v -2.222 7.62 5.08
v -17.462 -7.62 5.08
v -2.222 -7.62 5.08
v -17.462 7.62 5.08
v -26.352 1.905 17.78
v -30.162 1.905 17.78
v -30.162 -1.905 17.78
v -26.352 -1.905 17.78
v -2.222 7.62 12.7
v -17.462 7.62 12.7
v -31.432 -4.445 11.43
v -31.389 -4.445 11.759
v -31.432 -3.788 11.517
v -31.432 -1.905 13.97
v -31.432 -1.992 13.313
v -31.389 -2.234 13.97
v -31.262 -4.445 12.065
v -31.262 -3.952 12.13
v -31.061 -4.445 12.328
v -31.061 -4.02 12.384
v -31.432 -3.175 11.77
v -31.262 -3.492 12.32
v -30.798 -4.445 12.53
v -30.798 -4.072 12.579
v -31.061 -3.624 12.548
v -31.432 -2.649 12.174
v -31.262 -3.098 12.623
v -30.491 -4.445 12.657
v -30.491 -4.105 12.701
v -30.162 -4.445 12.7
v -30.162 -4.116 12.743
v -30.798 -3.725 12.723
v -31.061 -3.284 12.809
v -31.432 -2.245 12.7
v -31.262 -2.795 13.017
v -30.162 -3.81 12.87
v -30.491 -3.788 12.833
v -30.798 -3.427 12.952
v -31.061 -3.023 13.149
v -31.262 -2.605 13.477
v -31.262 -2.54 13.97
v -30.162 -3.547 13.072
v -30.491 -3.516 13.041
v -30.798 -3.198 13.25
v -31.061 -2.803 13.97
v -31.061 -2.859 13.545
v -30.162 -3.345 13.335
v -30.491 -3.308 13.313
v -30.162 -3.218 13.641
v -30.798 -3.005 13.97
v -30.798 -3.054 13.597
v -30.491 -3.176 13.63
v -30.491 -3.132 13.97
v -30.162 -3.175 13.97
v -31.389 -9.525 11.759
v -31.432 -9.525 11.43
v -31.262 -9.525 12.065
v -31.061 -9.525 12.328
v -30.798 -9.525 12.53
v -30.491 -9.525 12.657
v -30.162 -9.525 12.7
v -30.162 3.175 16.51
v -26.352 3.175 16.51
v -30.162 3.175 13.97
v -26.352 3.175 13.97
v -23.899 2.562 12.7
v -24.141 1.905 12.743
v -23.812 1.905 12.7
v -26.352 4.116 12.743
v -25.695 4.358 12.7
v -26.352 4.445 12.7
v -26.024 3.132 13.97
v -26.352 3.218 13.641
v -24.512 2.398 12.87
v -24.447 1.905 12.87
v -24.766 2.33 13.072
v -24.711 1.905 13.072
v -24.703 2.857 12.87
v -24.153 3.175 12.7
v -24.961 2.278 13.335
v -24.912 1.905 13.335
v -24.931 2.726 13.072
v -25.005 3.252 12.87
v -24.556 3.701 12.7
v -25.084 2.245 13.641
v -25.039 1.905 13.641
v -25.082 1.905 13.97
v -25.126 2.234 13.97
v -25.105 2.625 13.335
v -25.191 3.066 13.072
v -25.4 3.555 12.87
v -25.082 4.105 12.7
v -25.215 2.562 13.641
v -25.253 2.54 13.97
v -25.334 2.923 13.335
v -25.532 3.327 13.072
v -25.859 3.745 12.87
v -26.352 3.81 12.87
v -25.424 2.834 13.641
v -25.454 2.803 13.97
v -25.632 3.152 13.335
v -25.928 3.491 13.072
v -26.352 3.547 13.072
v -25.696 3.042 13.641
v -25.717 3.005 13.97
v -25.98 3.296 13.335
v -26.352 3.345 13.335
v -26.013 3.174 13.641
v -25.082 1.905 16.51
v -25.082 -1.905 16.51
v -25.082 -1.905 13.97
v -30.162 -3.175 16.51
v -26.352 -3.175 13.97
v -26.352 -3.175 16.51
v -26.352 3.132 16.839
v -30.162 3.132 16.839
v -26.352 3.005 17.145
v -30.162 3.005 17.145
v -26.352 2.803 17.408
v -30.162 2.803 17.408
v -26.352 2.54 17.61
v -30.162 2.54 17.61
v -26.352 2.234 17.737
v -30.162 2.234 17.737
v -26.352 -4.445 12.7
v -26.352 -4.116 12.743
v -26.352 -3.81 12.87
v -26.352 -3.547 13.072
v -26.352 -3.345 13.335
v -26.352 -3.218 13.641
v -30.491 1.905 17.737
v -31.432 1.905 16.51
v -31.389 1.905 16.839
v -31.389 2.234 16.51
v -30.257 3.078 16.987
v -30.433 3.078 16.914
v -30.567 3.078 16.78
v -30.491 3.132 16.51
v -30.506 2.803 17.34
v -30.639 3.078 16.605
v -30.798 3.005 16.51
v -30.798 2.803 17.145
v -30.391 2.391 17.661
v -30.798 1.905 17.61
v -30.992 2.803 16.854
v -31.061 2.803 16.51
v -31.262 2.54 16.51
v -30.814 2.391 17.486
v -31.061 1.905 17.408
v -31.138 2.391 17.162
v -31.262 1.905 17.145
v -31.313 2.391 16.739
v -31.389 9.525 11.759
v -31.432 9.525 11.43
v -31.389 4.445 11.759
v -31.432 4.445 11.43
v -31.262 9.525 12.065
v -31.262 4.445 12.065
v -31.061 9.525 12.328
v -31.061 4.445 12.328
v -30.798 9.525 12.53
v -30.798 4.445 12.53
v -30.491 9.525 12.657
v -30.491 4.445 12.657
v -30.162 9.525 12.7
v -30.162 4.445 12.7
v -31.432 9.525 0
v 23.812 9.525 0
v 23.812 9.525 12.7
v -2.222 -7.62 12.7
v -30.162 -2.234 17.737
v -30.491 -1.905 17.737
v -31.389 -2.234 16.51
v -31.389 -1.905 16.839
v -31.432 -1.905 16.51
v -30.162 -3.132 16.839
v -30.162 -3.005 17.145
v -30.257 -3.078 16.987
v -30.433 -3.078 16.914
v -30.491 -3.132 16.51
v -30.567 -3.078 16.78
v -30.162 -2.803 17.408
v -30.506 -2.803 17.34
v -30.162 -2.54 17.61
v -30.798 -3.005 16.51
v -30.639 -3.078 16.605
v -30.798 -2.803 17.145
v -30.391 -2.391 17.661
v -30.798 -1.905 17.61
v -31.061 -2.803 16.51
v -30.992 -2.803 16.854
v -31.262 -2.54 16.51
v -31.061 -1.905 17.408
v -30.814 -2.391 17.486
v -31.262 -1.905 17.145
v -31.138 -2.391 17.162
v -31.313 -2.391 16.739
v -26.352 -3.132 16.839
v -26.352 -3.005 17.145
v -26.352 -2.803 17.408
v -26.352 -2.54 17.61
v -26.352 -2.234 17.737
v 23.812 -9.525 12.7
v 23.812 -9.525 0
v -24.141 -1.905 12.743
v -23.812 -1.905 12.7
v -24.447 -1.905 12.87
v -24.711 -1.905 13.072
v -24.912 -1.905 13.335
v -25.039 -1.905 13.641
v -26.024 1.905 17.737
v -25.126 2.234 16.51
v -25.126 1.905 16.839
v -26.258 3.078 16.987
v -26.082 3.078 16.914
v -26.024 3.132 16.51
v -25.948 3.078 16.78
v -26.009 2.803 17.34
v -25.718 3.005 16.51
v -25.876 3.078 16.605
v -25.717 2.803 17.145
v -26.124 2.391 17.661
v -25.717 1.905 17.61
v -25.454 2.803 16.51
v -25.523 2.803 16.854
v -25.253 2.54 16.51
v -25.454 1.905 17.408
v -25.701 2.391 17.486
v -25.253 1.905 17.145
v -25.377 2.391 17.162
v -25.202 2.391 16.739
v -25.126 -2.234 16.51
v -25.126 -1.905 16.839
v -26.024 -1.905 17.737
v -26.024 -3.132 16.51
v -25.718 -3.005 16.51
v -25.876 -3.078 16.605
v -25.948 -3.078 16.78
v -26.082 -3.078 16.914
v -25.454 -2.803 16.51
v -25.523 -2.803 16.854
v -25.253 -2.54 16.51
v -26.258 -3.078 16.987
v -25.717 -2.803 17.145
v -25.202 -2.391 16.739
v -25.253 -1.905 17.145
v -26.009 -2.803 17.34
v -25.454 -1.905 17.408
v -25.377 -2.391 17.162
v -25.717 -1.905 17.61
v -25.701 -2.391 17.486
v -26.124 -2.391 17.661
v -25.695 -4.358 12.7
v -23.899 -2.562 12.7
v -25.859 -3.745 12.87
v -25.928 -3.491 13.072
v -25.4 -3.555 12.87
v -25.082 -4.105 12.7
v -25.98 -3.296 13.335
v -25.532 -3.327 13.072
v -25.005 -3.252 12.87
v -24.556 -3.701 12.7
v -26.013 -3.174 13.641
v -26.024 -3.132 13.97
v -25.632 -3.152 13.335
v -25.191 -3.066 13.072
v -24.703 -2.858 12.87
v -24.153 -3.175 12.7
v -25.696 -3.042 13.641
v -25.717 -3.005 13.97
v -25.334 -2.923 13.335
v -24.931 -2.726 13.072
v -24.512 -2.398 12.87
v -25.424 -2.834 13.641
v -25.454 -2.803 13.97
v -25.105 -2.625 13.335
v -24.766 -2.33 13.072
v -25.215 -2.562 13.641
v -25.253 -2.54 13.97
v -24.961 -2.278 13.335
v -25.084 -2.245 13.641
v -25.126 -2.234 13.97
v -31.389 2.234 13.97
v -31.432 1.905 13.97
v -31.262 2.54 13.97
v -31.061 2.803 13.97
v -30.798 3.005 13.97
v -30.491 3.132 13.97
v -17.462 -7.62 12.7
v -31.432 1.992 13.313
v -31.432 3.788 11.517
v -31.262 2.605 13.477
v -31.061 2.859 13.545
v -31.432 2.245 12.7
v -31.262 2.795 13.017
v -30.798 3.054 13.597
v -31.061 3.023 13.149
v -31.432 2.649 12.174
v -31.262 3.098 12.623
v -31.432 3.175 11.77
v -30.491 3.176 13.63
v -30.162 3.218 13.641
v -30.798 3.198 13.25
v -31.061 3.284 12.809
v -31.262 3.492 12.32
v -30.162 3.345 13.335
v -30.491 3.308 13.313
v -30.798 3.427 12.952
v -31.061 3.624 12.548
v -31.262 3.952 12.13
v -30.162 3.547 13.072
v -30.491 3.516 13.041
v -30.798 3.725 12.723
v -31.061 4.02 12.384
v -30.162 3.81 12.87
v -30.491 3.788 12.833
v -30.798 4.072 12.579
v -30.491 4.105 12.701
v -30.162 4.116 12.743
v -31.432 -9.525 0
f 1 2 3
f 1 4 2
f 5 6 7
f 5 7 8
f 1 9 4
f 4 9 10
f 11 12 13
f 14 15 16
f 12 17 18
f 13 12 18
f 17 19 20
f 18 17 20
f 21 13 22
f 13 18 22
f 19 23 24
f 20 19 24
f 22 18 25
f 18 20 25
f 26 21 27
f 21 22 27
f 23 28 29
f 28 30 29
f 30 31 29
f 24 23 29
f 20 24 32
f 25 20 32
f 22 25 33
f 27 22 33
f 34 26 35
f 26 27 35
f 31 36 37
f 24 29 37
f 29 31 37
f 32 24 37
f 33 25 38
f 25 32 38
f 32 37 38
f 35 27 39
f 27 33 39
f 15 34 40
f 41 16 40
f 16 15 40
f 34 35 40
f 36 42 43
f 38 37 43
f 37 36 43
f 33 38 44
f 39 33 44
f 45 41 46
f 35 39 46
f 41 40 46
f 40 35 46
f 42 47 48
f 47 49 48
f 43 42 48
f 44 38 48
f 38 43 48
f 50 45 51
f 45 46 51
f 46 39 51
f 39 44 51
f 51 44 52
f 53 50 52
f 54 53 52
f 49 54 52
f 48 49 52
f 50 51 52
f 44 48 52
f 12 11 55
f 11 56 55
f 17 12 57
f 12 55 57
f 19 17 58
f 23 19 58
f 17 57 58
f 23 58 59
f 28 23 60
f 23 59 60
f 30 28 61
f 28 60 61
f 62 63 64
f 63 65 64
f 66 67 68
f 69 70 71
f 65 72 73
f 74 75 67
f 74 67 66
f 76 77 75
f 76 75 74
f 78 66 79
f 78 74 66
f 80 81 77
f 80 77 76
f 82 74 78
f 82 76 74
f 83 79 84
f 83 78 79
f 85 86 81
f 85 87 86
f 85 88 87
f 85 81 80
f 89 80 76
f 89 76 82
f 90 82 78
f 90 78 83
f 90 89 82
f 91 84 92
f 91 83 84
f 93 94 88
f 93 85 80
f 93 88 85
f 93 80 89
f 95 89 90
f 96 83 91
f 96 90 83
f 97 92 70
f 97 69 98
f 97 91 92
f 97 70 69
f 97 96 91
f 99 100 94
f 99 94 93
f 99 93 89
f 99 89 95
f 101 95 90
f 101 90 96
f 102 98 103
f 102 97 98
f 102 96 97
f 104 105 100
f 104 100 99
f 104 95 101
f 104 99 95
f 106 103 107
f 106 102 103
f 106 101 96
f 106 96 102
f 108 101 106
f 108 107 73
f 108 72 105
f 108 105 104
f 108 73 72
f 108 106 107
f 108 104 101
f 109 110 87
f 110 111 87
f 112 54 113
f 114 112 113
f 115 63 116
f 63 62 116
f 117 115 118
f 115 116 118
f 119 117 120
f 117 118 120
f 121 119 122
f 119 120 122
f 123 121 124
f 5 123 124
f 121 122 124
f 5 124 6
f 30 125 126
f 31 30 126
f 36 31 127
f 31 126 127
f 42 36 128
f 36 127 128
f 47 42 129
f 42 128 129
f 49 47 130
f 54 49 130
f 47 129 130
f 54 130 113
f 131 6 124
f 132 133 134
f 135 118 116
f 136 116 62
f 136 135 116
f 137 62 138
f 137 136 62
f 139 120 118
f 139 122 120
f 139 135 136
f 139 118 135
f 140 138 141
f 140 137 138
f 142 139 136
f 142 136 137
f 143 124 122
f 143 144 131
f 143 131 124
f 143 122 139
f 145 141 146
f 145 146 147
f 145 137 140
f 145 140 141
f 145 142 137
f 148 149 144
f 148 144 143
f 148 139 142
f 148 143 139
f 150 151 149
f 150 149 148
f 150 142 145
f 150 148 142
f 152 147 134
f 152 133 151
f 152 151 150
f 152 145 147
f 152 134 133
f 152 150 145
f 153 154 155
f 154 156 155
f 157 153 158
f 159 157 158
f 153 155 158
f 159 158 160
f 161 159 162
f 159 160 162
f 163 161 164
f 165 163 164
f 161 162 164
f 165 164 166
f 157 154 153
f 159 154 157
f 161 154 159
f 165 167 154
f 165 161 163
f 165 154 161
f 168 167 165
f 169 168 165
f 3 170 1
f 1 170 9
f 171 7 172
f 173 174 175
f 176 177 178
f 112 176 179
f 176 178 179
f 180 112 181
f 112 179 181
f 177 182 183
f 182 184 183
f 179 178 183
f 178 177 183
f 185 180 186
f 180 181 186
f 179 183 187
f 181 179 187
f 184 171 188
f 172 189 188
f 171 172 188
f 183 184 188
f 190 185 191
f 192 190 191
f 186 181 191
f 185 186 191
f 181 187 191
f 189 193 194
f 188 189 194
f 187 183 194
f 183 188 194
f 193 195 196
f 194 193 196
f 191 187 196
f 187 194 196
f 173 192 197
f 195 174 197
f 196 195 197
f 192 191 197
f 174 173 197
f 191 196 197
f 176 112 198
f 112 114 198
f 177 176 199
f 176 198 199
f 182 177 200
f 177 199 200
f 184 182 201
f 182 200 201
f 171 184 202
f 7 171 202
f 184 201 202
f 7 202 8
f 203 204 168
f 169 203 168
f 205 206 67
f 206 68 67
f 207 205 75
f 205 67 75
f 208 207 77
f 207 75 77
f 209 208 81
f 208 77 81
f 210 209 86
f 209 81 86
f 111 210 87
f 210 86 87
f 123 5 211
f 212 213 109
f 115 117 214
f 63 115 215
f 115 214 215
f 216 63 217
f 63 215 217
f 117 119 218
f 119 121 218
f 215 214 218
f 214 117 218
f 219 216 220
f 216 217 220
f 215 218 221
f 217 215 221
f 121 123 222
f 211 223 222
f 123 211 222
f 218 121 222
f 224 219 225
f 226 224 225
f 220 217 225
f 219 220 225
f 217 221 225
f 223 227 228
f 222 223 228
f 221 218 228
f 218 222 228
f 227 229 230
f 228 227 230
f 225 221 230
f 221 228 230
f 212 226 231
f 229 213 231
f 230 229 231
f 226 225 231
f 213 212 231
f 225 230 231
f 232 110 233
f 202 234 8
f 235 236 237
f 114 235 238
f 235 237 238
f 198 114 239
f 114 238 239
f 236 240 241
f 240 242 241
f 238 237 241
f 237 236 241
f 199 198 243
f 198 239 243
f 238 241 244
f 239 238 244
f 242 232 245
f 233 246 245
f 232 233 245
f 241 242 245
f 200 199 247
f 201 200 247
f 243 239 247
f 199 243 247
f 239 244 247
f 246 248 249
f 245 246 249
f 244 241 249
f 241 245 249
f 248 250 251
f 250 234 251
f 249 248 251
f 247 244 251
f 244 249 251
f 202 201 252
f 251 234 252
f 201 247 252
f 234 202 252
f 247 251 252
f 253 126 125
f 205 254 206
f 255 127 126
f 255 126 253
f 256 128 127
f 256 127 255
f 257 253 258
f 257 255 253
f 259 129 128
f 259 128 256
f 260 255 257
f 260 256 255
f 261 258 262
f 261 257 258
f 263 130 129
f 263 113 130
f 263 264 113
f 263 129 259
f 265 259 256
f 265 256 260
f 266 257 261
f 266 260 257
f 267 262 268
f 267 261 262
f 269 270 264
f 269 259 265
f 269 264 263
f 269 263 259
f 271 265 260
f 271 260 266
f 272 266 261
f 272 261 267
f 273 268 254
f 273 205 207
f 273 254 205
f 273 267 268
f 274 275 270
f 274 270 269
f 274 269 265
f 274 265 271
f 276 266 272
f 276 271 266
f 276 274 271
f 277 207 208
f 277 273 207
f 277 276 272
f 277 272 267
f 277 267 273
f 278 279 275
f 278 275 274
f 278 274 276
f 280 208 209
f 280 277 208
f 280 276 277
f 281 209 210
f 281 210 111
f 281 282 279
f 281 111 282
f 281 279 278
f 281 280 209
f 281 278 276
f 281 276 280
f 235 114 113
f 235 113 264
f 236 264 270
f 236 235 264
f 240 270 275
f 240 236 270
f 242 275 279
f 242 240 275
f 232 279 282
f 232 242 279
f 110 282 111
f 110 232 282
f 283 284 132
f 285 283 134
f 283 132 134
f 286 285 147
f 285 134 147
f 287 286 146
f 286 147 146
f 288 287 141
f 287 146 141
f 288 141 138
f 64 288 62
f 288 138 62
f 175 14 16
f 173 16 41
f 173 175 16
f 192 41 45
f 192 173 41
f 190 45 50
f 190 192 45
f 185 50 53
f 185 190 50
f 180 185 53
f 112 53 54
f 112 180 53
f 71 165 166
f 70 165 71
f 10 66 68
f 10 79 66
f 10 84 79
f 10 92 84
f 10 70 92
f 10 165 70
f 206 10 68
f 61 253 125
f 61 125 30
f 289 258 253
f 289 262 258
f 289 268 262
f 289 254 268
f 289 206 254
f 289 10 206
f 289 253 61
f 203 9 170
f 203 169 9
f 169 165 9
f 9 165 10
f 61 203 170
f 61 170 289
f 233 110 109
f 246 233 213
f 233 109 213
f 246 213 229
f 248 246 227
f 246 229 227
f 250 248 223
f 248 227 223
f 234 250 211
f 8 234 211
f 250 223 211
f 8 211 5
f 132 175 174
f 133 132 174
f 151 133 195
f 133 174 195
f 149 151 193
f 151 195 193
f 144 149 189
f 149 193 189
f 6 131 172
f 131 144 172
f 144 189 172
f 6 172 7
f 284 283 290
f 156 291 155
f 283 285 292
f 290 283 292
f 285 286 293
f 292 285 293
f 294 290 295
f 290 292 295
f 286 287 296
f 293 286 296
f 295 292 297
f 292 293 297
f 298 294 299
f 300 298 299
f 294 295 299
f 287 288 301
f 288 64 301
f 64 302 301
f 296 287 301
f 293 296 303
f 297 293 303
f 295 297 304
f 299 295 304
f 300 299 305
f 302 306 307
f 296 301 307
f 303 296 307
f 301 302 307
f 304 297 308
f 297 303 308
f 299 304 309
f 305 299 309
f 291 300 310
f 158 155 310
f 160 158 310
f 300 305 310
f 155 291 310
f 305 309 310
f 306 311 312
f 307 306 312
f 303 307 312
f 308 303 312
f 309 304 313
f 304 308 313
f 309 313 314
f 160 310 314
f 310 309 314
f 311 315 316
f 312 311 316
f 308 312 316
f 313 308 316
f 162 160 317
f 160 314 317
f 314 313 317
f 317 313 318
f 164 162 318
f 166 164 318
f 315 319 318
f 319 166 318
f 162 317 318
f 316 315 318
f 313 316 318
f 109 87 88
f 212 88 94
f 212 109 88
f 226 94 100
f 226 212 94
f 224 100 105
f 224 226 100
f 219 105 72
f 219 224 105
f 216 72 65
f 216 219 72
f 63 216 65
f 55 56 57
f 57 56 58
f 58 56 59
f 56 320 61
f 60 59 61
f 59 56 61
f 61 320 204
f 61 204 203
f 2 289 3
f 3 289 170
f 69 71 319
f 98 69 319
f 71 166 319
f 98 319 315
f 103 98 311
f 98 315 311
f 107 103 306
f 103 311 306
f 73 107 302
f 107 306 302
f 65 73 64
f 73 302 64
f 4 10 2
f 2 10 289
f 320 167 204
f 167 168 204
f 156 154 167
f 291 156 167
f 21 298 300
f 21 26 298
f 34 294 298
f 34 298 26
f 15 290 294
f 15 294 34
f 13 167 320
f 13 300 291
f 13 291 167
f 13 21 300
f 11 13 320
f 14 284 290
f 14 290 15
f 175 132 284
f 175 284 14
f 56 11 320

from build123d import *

# Parameters (mm, degrees)
F0_W     = 47.625
F0_H     = 19.05
F1_DEPTH = 12.7
F3_DEPTH = 7.62
F4_W     = 19.05
F4_H     = 12.7
F5_DEPTH = 7.62
F7_DEPTH = 5.08
F8_R     = 1.27


with BuildPart() as f1:
    # F0 (on Top) → F1 (new body)
    with BuildSketch(Plane.XY):
        Rectangle(F0_W, F0_H)
    extrude(amount=F1_DEPTH)

    # F2 (on face) → F3 (cut)
    with BuildSketch(Plane.XY.offset(12.7)):
        Polygon((-17.4625, -7.62), (-2.2225, -7.62), (-2.2225, 0), (-2.2225, 7.62), (-17.4625, 7.62), align=None)
    extrude(amount=-F3_DEPTH, mode=Mode.SUBTRACT)

    # F4 (on face) → F5 (join)
    with BuildSketch(Plane(origin=(-23.8125, 0, 0), x_dir=(0, -1, 0), z_dir=(-1, 0, 0))):
        with Locations((0, 6.35)):
            Rectangle(F4_W, F4_H)
    extrude(amount=F5_DEPTH)

    # F6 (on face) → F7 (join)
    with BuildSketch(Plane.XY.offset(12.7)):
        Polygon((-28.2575, 3.175), (-31.4325, 3.175), (-31.4325, -3.175), (-25.0825, -3.175), (-25.0825, 3.175), align=None)
    extrude(amount=F7_DEPTH)

    # F8
    f8_edges = [f1.edges().sort_by_distance(p)[0] for p in [
        (-31.4325, 0, 17.78),
        (-25.0825, 0, 17.78),
        (-25.0825, -3.175, 15.24),
        (-28.2575, -3.175, 17.78),
        (-28.2575, 3.175, 17.78),
        (-31.4325, -3.175, 15.24),
        (-28.2575, -3.175, 12.7),
        (-25.0825, 0, 12.7),
        (-28.2575, 3.175, 12.7),
        (-31.4325, 3.175, 15.24),
        (-25.0825, 3.175, 15.24),
        (-31.4325, -6.35, 12.7),
        (-31.4325, 6.35, 12.7),
    ]]
    fillet(f8_edges, radius=F8_R)


solid = f1.part
